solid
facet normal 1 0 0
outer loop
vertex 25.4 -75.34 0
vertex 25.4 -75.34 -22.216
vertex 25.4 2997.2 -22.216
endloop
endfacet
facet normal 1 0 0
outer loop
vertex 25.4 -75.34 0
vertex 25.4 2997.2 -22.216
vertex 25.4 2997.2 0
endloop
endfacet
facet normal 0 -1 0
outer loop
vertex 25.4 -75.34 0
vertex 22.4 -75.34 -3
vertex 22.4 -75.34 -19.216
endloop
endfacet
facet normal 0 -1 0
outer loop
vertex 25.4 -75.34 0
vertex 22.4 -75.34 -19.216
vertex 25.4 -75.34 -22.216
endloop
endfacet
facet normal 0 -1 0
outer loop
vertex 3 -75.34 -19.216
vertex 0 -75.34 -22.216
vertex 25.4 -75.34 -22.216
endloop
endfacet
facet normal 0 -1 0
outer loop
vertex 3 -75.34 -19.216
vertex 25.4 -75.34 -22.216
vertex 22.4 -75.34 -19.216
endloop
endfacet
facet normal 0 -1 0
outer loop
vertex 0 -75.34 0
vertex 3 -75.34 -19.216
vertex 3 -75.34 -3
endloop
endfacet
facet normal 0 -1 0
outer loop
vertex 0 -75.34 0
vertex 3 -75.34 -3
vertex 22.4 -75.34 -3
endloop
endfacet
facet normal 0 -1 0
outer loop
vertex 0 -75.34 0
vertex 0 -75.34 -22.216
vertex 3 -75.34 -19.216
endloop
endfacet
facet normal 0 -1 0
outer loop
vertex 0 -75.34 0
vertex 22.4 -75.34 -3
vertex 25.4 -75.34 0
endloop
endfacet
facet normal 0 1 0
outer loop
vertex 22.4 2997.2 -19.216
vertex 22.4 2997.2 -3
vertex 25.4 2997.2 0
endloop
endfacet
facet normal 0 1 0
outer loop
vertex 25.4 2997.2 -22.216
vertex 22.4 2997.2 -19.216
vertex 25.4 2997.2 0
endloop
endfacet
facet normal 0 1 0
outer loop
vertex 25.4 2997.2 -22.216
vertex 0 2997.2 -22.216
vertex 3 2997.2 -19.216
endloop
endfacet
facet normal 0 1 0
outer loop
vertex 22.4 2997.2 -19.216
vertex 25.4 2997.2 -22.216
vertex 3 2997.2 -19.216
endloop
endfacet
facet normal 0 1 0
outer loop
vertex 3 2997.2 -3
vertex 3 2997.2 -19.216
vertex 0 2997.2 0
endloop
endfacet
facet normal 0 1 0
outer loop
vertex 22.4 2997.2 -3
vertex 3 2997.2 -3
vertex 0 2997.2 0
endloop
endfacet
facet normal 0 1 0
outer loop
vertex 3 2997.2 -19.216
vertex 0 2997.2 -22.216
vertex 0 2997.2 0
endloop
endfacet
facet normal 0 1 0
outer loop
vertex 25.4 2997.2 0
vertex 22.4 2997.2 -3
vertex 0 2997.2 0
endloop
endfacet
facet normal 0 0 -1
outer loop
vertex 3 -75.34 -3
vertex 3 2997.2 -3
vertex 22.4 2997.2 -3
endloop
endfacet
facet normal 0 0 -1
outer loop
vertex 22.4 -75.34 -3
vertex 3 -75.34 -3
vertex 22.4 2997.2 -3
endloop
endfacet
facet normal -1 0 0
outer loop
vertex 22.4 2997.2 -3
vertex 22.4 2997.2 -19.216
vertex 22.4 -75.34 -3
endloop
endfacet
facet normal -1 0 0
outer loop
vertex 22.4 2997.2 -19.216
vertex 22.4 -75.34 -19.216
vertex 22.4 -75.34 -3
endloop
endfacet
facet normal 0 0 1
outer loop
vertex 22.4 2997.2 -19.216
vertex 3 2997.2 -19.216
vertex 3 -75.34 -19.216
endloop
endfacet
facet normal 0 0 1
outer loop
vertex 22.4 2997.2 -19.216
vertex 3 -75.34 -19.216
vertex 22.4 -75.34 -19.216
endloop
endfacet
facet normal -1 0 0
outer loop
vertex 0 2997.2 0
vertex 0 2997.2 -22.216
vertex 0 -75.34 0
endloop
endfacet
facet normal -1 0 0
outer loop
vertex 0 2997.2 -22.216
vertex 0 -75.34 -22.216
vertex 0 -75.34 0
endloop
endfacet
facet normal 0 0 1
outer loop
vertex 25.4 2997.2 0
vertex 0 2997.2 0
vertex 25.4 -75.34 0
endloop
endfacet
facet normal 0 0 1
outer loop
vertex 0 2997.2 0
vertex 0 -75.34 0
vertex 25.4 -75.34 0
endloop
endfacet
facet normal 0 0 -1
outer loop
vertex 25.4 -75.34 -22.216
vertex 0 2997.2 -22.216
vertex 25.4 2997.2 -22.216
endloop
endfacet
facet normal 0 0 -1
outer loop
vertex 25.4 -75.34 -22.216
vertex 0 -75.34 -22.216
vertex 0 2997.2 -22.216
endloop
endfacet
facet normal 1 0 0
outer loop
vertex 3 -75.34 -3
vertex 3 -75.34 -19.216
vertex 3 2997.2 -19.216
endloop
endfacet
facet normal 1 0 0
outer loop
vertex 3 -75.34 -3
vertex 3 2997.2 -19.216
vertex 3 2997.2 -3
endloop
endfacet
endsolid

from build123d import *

# Parameters (mm, degrees)
F0_W     = 75.3402784467
F0_H     = 22.2155153751
F1_DEPTH = 25.4
F2_T     = -3
F3_DEPTH = 2997.2


with BuildPart() as f1:
    # F0 (on Right) → F1 (new body)
    with BuildSketch(Plane.YZ):
        with Locations((-37.6701392233, -11.1077576876)):
            Rectangle(F0_W, F0_H)
    extrude(amount=F1_DEPTH)

    # F2
    f2_openings = [f1.faces().sort_by_distance(p)[0] for p in [
        (12.7, -75.340278, -11.107758),
        (12.7, 0, -11.107758),
    ]]
    offset(amount=F2_T, openings=f2_openings)

    # F3 (add): a face of the model
    f3_faces = [f1.faces().sort_by_distance(p)[0] for p in [
        (12.7, 0, -21.8780706947),
    ]]
    extrude(f3_faces, amount=F3_DEPTH)


solid = f1.part
